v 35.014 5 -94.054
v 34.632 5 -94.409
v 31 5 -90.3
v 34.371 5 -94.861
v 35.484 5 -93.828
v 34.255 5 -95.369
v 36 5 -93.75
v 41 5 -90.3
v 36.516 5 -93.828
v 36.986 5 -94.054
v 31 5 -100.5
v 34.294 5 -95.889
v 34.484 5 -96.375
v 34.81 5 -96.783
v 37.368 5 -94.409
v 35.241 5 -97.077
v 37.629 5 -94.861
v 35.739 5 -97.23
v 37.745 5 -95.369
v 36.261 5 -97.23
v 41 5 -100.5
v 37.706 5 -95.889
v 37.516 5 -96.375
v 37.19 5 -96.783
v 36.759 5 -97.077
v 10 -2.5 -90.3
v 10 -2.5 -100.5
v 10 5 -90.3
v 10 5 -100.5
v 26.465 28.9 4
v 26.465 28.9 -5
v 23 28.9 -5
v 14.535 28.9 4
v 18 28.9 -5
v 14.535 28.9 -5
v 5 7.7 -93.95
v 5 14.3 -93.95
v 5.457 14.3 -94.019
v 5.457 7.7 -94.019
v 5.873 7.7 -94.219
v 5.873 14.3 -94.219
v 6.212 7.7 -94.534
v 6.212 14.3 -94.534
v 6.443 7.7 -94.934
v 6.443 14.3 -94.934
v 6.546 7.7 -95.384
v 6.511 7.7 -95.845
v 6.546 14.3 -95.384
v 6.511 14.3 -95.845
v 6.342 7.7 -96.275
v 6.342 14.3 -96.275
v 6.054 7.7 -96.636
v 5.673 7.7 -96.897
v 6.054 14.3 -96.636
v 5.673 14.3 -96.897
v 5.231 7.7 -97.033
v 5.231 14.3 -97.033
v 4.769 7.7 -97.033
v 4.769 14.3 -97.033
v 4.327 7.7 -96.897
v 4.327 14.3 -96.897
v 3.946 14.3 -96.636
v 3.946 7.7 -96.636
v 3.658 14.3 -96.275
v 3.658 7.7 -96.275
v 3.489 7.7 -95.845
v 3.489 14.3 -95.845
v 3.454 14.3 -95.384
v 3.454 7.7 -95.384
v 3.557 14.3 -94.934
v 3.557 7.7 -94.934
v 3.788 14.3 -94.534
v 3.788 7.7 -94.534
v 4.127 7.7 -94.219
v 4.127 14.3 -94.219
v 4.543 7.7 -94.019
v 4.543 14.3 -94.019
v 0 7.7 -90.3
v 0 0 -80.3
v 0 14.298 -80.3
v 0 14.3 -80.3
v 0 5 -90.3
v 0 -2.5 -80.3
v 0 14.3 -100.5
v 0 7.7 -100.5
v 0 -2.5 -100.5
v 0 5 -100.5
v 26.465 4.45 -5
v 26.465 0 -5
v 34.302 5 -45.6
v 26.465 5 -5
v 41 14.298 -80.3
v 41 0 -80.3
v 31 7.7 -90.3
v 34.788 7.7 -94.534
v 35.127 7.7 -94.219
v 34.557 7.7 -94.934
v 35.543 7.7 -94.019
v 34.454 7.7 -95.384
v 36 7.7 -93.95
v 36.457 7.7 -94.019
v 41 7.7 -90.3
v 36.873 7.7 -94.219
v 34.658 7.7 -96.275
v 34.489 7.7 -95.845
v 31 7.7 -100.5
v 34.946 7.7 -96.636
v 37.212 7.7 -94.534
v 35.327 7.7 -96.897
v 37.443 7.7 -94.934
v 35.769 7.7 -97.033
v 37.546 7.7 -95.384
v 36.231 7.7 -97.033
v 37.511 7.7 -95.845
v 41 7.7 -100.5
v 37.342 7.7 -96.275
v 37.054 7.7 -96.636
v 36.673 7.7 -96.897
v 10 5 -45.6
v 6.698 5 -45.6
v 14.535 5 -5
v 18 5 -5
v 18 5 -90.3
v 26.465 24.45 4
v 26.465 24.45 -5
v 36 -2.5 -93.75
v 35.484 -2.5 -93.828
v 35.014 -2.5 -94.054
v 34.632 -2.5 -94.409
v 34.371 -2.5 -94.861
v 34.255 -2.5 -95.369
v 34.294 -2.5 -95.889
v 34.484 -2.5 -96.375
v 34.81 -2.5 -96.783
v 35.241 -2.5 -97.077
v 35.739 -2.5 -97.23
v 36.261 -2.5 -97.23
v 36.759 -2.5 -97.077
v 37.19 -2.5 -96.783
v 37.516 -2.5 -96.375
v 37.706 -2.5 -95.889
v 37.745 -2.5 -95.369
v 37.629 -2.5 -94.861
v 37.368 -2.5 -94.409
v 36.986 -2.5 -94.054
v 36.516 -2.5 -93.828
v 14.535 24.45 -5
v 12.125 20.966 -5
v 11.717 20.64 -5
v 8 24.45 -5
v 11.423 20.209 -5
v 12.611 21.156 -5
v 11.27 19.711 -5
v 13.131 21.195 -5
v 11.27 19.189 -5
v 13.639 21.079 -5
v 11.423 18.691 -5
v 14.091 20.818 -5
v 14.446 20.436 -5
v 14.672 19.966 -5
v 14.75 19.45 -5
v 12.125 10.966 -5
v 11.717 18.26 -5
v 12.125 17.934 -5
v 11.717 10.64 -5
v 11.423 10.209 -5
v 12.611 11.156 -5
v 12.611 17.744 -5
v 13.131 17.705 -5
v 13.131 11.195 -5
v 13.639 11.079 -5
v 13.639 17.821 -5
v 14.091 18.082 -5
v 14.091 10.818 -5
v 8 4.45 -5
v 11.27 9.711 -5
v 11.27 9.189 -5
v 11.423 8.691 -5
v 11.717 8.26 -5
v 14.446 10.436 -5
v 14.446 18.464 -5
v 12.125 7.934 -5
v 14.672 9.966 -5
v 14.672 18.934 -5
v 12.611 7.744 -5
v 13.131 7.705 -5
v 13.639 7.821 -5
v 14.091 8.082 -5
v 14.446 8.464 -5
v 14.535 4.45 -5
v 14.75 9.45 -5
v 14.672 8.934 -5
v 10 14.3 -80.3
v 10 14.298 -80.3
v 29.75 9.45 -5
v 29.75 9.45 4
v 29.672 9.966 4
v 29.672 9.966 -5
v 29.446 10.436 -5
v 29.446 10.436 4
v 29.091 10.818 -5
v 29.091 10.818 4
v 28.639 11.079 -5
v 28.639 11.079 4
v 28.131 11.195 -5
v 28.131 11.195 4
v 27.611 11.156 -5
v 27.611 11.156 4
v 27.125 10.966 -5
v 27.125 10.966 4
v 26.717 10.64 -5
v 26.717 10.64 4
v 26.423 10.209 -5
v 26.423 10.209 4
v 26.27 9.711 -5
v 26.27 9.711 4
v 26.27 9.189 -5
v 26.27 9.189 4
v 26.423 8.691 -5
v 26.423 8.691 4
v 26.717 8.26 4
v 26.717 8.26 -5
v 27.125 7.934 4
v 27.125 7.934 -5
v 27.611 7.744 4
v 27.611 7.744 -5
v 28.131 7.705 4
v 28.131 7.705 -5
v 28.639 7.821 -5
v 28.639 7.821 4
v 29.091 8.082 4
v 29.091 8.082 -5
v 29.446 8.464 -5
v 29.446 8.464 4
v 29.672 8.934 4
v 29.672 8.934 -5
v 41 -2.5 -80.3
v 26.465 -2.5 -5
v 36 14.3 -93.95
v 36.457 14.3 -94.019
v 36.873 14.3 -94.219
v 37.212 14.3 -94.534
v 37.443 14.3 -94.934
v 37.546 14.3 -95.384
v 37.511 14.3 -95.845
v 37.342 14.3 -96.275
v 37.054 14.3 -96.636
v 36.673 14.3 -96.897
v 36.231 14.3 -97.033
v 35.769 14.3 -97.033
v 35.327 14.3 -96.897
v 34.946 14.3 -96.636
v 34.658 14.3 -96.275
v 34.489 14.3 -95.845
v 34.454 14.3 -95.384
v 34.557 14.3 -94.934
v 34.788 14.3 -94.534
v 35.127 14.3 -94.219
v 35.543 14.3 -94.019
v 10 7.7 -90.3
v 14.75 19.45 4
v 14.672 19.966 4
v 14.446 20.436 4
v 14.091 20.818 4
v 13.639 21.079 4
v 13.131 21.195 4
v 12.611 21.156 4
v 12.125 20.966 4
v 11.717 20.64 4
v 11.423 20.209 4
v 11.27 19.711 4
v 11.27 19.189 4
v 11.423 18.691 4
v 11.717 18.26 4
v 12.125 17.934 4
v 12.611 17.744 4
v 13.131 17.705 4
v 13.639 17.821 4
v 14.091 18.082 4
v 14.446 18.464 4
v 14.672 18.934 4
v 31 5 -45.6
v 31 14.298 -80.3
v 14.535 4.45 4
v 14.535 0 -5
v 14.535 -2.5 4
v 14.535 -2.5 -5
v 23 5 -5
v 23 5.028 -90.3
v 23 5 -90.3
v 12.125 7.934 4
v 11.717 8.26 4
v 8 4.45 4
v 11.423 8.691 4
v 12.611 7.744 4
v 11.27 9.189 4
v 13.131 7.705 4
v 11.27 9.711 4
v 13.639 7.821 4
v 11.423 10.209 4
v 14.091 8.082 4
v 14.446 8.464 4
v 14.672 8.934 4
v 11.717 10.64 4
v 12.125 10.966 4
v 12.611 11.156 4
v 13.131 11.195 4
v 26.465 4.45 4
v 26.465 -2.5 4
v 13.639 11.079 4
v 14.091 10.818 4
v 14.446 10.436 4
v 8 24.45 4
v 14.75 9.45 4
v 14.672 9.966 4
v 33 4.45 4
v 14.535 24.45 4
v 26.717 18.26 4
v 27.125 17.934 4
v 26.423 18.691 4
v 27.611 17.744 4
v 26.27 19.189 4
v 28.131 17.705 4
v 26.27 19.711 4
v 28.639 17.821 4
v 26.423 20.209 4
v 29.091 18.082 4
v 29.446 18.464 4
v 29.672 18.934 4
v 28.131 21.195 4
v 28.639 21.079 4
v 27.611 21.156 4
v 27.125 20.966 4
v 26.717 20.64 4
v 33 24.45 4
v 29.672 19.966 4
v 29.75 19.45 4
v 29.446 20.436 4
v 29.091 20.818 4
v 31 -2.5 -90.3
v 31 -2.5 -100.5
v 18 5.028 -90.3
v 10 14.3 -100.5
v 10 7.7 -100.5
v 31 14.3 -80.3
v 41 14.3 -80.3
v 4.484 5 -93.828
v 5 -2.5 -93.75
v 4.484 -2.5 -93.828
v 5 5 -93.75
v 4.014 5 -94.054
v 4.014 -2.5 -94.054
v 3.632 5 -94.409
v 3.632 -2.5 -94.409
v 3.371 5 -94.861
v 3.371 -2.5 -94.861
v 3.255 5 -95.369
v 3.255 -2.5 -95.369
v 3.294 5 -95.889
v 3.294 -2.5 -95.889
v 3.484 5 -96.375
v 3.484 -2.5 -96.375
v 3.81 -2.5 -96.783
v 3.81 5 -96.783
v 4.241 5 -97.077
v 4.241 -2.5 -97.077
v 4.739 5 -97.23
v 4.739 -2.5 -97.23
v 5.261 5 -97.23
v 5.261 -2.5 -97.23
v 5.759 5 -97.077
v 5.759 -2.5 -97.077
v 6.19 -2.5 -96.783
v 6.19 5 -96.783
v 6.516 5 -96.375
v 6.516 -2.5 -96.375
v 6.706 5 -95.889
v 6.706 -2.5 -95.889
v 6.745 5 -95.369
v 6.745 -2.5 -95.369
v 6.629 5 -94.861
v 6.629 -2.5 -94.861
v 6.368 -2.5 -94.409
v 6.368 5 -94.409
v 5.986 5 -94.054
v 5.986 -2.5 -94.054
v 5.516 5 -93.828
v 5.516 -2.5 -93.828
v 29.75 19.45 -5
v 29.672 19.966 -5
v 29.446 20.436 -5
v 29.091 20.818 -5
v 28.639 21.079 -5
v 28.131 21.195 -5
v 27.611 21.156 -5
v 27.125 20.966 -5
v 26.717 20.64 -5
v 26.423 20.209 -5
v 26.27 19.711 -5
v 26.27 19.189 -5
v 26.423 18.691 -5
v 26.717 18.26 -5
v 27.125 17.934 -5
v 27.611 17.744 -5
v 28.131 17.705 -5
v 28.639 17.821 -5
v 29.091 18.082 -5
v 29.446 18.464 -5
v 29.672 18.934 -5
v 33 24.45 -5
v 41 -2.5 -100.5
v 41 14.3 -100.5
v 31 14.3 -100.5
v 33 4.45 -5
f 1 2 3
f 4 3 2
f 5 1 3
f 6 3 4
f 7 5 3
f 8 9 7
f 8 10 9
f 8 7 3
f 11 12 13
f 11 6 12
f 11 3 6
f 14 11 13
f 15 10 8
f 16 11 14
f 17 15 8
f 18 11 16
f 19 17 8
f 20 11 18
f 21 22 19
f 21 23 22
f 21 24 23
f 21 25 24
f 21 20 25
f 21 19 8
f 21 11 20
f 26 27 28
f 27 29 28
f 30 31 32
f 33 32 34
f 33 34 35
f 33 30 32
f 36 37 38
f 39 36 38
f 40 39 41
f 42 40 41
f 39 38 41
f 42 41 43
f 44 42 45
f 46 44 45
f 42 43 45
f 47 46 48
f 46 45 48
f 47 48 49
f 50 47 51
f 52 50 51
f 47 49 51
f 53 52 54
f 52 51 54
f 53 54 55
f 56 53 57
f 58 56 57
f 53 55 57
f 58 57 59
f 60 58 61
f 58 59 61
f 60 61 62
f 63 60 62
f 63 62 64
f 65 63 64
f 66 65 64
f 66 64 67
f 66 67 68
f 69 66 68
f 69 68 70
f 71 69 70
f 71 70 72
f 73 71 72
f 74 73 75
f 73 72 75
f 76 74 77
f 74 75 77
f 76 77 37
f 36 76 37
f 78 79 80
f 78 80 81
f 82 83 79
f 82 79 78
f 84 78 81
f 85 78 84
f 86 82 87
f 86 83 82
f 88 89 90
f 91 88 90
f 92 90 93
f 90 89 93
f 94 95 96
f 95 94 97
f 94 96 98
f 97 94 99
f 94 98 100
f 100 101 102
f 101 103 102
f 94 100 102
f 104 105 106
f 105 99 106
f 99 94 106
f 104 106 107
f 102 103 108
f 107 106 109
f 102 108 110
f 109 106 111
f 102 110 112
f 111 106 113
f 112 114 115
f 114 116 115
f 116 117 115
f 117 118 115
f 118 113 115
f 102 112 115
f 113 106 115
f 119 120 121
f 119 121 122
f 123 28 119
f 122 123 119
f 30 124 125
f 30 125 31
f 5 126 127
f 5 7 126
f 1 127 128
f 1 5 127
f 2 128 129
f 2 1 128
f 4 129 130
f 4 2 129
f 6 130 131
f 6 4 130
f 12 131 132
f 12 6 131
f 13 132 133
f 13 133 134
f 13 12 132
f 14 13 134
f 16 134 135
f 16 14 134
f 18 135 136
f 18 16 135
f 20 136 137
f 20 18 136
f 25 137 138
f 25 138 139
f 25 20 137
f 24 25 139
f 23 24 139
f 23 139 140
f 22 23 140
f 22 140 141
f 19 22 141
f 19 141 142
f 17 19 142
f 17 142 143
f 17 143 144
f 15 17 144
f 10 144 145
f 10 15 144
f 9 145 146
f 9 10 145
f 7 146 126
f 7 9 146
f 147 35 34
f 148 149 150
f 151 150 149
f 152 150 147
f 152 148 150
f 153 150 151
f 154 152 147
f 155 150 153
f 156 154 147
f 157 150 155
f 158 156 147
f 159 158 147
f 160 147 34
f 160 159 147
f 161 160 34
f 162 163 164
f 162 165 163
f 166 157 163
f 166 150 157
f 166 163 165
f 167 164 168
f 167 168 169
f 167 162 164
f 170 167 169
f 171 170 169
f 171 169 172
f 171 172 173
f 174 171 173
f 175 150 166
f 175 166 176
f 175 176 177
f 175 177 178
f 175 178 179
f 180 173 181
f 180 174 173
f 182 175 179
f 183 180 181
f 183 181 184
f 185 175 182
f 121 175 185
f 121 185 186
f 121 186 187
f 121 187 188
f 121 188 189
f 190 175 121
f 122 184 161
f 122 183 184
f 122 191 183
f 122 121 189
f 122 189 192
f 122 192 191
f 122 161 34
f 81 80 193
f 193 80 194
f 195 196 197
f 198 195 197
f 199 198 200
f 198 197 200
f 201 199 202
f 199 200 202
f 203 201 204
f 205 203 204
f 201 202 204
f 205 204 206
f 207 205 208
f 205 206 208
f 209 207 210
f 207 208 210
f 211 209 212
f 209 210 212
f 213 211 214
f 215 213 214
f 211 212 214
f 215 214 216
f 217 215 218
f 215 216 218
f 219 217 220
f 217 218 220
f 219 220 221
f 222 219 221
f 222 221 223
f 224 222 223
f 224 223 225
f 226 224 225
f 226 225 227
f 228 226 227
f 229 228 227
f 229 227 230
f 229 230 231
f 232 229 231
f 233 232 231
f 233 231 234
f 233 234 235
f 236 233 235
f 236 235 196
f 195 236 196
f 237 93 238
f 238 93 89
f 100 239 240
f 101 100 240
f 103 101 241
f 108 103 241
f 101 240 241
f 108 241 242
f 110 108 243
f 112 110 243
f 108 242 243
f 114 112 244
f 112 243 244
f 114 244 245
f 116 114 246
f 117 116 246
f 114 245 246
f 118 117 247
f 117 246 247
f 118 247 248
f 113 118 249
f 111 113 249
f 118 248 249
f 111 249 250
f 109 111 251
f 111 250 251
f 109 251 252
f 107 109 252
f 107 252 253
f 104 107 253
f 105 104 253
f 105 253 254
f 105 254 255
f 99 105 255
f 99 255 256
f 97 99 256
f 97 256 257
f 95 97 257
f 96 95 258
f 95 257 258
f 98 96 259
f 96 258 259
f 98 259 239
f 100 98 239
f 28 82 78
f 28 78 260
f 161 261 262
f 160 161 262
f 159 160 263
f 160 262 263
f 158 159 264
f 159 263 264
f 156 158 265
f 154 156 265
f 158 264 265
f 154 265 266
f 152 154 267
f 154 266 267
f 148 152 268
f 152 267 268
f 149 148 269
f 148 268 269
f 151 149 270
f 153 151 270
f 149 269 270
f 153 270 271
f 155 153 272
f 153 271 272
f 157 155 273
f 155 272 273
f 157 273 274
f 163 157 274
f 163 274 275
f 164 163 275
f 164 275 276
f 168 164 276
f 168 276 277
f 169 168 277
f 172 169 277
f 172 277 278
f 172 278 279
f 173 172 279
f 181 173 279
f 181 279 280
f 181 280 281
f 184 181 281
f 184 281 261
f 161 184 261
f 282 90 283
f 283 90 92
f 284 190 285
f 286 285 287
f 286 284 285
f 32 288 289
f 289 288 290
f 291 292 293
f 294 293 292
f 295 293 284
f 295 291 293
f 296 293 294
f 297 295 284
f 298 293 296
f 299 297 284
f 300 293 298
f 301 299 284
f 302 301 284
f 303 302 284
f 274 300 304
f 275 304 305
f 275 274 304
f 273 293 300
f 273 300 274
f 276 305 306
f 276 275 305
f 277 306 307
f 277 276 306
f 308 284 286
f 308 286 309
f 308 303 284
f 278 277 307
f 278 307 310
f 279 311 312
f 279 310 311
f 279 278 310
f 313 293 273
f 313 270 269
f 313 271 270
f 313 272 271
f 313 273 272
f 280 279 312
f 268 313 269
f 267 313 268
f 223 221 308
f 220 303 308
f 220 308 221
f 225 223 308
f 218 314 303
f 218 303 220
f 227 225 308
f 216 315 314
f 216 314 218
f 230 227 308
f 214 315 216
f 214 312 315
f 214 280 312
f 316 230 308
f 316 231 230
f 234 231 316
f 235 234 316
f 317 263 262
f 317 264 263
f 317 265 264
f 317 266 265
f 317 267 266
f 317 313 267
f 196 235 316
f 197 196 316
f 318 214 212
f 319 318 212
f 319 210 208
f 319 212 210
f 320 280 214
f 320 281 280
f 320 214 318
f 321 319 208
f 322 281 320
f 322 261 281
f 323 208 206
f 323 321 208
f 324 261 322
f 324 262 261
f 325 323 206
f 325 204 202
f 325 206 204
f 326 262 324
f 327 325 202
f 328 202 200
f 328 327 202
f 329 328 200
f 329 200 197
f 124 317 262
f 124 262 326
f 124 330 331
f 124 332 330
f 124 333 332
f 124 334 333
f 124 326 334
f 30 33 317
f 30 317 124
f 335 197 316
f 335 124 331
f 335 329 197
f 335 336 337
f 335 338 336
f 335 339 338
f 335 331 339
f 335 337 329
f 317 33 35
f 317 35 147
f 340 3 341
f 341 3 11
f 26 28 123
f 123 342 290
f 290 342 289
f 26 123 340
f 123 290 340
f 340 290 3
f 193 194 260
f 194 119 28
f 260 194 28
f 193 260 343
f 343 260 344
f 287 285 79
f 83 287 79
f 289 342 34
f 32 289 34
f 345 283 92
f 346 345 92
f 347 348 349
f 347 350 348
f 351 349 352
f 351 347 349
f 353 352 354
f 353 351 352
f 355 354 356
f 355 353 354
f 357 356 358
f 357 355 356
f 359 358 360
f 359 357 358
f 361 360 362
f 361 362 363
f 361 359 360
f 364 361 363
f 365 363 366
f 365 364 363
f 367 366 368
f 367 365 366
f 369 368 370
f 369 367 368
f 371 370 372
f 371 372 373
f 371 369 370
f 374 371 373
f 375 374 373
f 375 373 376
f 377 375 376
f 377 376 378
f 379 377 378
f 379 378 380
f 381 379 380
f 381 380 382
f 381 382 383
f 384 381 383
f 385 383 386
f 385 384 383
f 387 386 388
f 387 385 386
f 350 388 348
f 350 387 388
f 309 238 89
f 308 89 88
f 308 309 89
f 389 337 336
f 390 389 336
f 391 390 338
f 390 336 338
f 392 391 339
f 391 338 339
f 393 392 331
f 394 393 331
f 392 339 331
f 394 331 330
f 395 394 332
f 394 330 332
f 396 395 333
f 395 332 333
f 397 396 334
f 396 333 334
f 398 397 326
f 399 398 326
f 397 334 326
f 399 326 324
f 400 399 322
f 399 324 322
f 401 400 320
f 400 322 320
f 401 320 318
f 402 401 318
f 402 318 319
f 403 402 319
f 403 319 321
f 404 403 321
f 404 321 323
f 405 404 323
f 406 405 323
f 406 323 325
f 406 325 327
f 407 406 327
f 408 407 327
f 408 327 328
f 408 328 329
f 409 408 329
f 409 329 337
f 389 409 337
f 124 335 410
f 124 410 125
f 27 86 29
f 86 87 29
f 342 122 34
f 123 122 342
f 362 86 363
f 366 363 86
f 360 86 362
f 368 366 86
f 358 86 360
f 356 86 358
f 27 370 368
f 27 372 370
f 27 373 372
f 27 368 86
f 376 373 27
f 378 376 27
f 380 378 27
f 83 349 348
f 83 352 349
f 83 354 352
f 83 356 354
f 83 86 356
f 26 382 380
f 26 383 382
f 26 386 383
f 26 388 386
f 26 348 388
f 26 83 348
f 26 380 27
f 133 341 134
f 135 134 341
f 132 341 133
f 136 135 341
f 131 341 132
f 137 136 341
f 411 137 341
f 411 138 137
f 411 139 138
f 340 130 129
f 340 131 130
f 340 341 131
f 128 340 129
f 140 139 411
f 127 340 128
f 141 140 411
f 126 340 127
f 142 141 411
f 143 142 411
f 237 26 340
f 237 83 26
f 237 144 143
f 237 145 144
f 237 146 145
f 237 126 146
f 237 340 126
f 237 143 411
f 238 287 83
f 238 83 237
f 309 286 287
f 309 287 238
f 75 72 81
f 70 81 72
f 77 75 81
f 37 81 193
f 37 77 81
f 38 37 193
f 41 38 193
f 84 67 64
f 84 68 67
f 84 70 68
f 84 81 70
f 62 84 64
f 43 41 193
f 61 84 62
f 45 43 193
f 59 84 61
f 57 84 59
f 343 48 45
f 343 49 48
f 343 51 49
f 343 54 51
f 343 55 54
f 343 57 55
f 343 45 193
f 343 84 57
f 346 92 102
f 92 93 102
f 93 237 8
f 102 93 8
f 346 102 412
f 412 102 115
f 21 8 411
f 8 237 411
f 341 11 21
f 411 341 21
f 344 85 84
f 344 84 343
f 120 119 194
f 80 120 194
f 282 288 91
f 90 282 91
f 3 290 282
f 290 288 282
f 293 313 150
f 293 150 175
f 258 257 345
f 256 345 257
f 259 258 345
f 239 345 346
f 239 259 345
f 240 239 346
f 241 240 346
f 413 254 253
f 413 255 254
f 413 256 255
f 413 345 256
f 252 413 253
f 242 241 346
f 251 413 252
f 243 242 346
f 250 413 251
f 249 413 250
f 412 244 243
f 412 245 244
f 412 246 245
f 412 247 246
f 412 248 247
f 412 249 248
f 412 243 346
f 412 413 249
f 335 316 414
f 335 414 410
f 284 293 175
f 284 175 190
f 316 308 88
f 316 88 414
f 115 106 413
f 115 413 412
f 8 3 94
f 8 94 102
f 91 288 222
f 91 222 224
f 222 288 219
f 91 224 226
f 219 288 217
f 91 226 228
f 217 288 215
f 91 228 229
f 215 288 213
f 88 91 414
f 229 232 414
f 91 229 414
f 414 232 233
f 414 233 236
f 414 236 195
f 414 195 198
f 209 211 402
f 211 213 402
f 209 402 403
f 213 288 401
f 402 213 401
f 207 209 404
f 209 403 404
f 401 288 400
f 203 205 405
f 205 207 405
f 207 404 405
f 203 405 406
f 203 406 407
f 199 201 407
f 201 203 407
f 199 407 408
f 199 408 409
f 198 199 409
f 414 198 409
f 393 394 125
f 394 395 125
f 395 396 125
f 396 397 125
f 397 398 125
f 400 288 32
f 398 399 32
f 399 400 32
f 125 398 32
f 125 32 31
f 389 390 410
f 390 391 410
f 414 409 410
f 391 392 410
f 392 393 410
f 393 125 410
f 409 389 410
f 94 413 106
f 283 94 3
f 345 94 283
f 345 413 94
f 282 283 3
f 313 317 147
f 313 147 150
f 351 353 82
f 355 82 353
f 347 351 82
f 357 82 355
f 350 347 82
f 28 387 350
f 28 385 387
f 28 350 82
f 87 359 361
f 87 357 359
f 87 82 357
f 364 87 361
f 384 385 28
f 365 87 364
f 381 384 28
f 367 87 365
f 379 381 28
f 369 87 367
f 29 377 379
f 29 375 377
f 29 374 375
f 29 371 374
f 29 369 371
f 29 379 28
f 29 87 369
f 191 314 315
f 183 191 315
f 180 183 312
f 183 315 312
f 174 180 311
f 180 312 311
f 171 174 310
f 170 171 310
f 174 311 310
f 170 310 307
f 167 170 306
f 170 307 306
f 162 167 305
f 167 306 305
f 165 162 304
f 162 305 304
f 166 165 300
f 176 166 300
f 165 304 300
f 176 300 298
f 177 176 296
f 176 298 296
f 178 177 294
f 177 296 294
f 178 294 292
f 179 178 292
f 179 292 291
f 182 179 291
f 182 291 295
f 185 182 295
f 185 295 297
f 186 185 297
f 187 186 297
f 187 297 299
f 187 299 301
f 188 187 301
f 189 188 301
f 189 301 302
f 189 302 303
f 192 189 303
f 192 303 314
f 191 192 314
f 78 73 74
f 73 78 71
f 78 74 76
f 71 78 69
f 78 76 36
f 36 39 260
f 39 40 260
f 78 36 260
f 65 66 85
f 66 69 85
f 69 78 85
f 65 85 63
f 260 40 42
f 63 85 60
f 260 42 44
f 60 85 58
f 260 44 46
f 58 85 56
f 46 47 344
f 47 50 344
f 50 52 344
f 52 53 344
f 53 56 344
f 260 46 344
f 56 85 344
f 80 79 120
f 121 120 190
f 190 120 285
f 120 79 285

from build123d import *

# Parameters (mm, degrees)
SKETCH1_W            = 41
SKETCH1_H            = 100.5
BOSS_EXTRUDE1_DEPTH  = 5
SKETCH2_W            = 21
SKETCH2_H            = 10.2
CUT_EXTRUDE1_DEPTH   = 109.656569061
SKETCH9_R            = 1.75
CUT_EXTRUDE4_DEPTH   = 109.656569061
CUT_EXTRUDE5_DEPTH   = 109.656569061
BOSS_EXTRUDE4_DEPTH  = 23.9
SKETCH16_W           = 5
SKETCH16_H           = 85.3
BOSS_EXTRUDE5_DEPTH  = 23.9
CUT_EXTRUDE8_DEPTH   = 108.072218619
BOSS_EXTRUDE6_DEPTH  = 28.9
SKETCH25_W           = 6.53486924
SKETCH25_H           = 4.45
CUT_EXTRUDE9_DEPTH   = 108.872424651
SKETCH26_R           = 1.75
CUT_EXTRUDE10_DEPTH  = 113.323016341
SKETCH27_R           = 1.75
BOSS_EXTRUDE7_DEPTH  = 2.5
BOSS_EXTRUDE8_START  = 4
SKETCH28_R           = 1.75
BOSS_EXTRUDE8_DEPTH  = 4
SKETCH29_W           = 10
SKETCH29_H           = 10
BOSS_EXTRUDE9_DEPTH  = 2.7
SKETCH30_W           = 10
SKETCH30_H           = 20.2
BOSS_EXTRUDE10_DEPTH = 6.6
SKETCH31_R           = 1.55
CUT_EXTRUDE11_DEPTH  = 6.6
CHAMFER2_SIZE        = 34.7
CHAMFER2_SIZE_2      = 9.297836977


with BuildPart() as part:
    # Sketch1 → Boss-Extrude1 (new body)
    with BuildSketch(Plane(origin=(0, 0, 0), x_dir=(1, 0, 0), z_dir=(0, 1, 0))):
        with Locations((20.5, 50.25)):
            Rectangle(SKETCH1_W, SKETCH1_H)
    extrude(amount=BOSS_EXTRUDE1_DEPTH)

    # Sketch2 → Cut-Extrude1 (cut, through all)
    with BuildSketch(Plane(origin=(0, 5, 0), x_dir=(1, 0, 0), z_dir=(0, 1, 0))):
        with Locations((20.5, 95.4)):
            Rectangle(SKETCH2_W, SKETCH2_H)
    extrude(amount=-CUT_EXTRUDE1_DEPTH, mode=Mode.SUBTRACT)

    # Sketch9 → Cut-Extrude4 (cut, through all)
    with BuildSketch(Plane(origin=(0, 5, 0), x_dir=(1, 0, 0), z_dir=(0, 1, 0))):
        with Locations(Location((5, 95.5, 0), (0, 0, 270))):
            Circle(SKETCH9_R)
        with Locations(Location((36, 95.5, 0), (0, 0, 270))):
            Circle(SKETCH9_R)
    extrude(amount=-CUT_EXTRUDE4_DEPTH, mode=Mode.SUBTRACT)

    # Sketch11 → Cut-Extrude5 (cut, through all)
    with BuildSketch(Plane(origin=(0, 5, 0), x_dir=(1, 0, 0), z_dir=(0, 1, 0))):
        Polygon((15.5, 0), (0, 80.3), (0, 0), align=None)
        Polygon((25.5, 0), (41, 80.3), (41, 0), align=None)
    extrude(amount=-CUT_EXTRUDE5_DEPTH, mode=Mode.SUBTRACT)

    # Sketch12 → Boss-Extrude4 (add)
    with BuildSketch(Plane(origin=(0, 5, 0), x_dir=(1, 0, 0), z_dir=(0, 1, 0))):
        Polygon((25.5, 0), (15.5, 0), (14.53486924, 5), (26.46513076, 5), align=None)
    extrude(amount=BOSS_EXTRUDE4_DEPTH)

    # Sketch16 → Boss-Extrude5 (add)
    with BuildSketch(Plane(origin=(0, 5, 0), x_dir=(1, 0, 0), z_dir=(0, 1, 0))):
        with Locations((20.5, 47.65)):
            Rectangle(SKETCH16_W, SKETCH16_H)
    extrude(amount=BOSS_EXTRUDE5_DEPTH)

    # Sketch17 → Cut-Extrude8 (cut, through all)
    with BuildSketch(Plane.ZY.offset(-18)):
        Polygon((-90.4, 5), (-5, 28.9), (-90.3, 28.9), align=None)
    extrude(amount=-CUT_EXTRUDE8_DEPTH, mode=Mode.SUBTRACT)

    # Sketch23 → Boss-Extrude6 (add)
    with BuildSketch(Plane(origin=(0, 28.9, 0), x_dir=(1, 0, 0), z_dir=(0, 1, 0))):
        Polygon((26.46513076, 5), (33, 5), (33, 0), (25.5, 0), align=None)
        Polygon((14.53486924, 5), (8, 5), (8, 0), (15.5, 0), align=None)
    extrude(amount=-BOSS_EXTRUDE6_DEPTH)

    # Sketch25 → Cut-Extrude9 (cut, through all)
    with BuildSketch(Plane(origin=(0, 0, -5), x_dir=(-1, 0, 0), z_dir=(0, 0, -1))):
        with Locations((-11.26743462, 2.225)):
            Rectangle(SKETCH25_W, SKETCH25_H)
        with Locations((-29.73256538, 2.225)):
            Rectangle(SKETCH25_W, SKETCH25_H)
        with Locations((-11.26743462, 26.675)):
            Rectangle(SKETCH25_W, SKETCH25_H)
        with Locations((-29.73256538, 26.675)):
            Rectangle(SKETCH25_W, SKETCH25_H)
    extrude(amount=-CUT_EXTRUDE9_DEPTH, mode=Mode.SUBTRACT)

    # Sketch26 → Cut-Extrude10 (cut, through all)
    with BuildSketch(Plane.XY):
        with Locations((13, 19.45)):
            Circle(SKETCH26_R)
        with Locations((28, 19.45)):
            Circle(SKETCH26_R)
        with Locations((13, 9.45)):
            Circle(SKETCH26_R)
        with Locations((28, 9.45)):
            Circle(SKETCH26_R)
    extrude(amount=-CUT_EXTRUDE10_DEPTH, mode=Mode.SUBTRACT)

    # Sketch27 → Boss-Extrude7 (add)
    with BuildSketch(Plane.XZ):
        Polygon((26.46513076, -5), (26.46513076, 0), (14.53486924, 0), (14.53486924, -5), (0, -80.3), (0, -100.5), (10, -100.5), (10, -90.3), (31, -90.3), (31, -100.5), (41, -100.5), (41, -80.3), align=None)
        with Locations(Location((5, -95.5, 0), (0, 0, 90))):
            Circle(SKETCH27_R, mode=Mode.SUBTRACT)
        with Locations(Location((36, -95.5, 0), (0, 0, 90))):
            Circle(SKETCH27_R, mode=Mode.SUBTRACT)
    extrude(amount=BOSS_EXTRUDE7_DEPTH)

    # Sketch28 → Boss-Extrude8 (add)
    with BuildSketch(Plane.XY.offset(BOSS_EXTRUDE8_START)):
        Polygon((26.46513076, -2.5), (26.46513076, 4.45), (33, 4.45), (33, 24.45), (26.46513076, 24.45), (26.46513076, 28.9), (14.53486924, 28.9), (14.53486924, 24.45), (8, 24.45), (8, 4.45), (14.53486924, 4.45), (14.53486924, -2.5), align=None)
        with Locations((28, 9.45)):
            Circle(SKETCH28_R, mode=Mode.SUBTRACT)
        with Locations((13, 9.45)):
            Circle(SKETCH28_R, mode=Mode.SUBTRACT)
        with Locations((28, 19.45)):
            Circle(SKETCH28_R, mode=Mode.SUBTRACT)
        with Locations((13, 19.45)):
            Circle(SKETCH28_R, mode=Mode.SUBTRACT)
    extrude(amount=-BOSS_EXTRUDE8_DEPTH)

    # Sketch29 → Boss-Extrude9 (add)
    with BuildSketch(Plane(origin=(0, 5, 0), x_dir=(1, 0, 0), z_dir=(0, 1, 0))):
        with Locations((36, 85.3)):
            Rectangle(SKETCH29_W, SKETCH29_H)
        with Locations((5, 85.3)):
            Rectangle(SKETCH29_W, SKETCH29_H)
    extrude(amount=BOSS_EXTRUDE9_DEPTH)

    # Sketch30 → Boss-Extrude10 (add)
    with BuildSketch(Plane(origin=(0, 7.7, 0), x_dir=(1, 0, 0), z_dir=(0, 1, 0))):
        with Locations((5, 90.4)):
            Rectangle(SKETCH30_W, SKETCH30_H)
        with Locations((36, 90.4)):
            Rectangle(SKETCH30_W, SKETCH30_H)
    extrude(amount=BOSS_EXTRUDE10_DEPTH)

    # Sketch31 → Cut-Extrude11 (cut)
    with BuildSketch(Plane(origin=(0, 14.3, 0), x_dir=(1, 0, 0), z_dir=(0, 1, 0))):
        with Locations(Location((36, 95.5, 0), (0, 0, 270))):
            Circle(SKETCH31_R)
        with Locations(Location((5, 95.5, 0), (0, 0, 270))):
            Circle(SKETCH31_R)
    extrude(amount=-CUT_EXTRUDE11_DEPTH, mode=Mode.SUBTRACT)

    # Chamfer2
    # the kernel refuses this chamfer: 34.7, 9.297836977 mm, written as the material it adds along each edge
    with BuildSketch(Plane(origin=(41, 5, -80.3), x_dir=(0, -0.009967146577156432, 0.9999503267608395), z_dir=(-1, 0, 0))) as chamfer2_piece_1_section:
        Polygon((CHAMFER2_SIZE * 0.999950326761, CHAMFER2_SIZE * 0.00996714657716), (-CHAMFER2_SIZE_2 * 0.00996714657754, CHAMFER2_SIZE_2 * 0.9999503268), (0, 0), align=None)
    chamfer2_piece_1 = extrude(amount=10, mode=Mode.PRIVATE)
    chamfer2_piece_1 = split(chamfer2_piece_1, bisect_by=Plane(origin=(38.932419972, 8.049756371, -69.588601533), z_dir=(-0.9818753883596208, 0, -0.1895276278900885)), keep=Keep.TOP, mode=Mode.PRIVATE)
    add(chamfer2_piece_1)
    with BuildSketch(Plane(origin=(41, 5, -80.3), x_dir=(0, -0.009967146577156432, 0.9999503267608395), z_dir=(-1, 0, 0))) as chamfer2_piece_2_section:
        Polygon((CHAMFER2_SIZE * 0.999950326761, CHAMFER2_SIZE * 0.00996714657716), (-CHAMFER2_SIZE_2 * 0.00996714657754, CHAMFER2_SIZE_2 * 0.9999503268), (0, 0), align=None)
    chamfer2_piece_2 = extrude(amount=100.106238486, mode=Mode.PRIVATE)
    chamfer2_piece_2 = split(chamfer2_piece_2, bisect_by=Plane(origin=(2.067580028, 8.049756371, -69.588601533), z_dir=(0.9818753883596207, 0, -0.18952762789008884)), keep=Keep.TOP, mode=Mode.PRIVATE)
    chamfer2_piece_2 = split(chamfer2_piece_2, bisect_by=Plane(origin=(0, 8.049756371, -70.340774245), z_dir=(1, 0, 0)), keep=Keep.TOP, mode=Mode.PRIVATE)
    chamfer2_piece_2 = split(chamfer2_piece_2, bisect_by=Plane(origin=(10, 8.049756371, -70.340774245), z_dir=(-1, 0, 0)), keep=Keep.TOP, mode=Mode.PRIVATE)
    add(chamfer2_piece_2)
    with BuildSketch(Plane(origin=(0, 5, -80.3), x_dir=(0, -0.009967146577156432, 0.9999503267608395), z_dir=(1, 0, 0))) as chamfer2_piece_3_section:
        Polygon((CHAMFER2_SIZE * 0.999950326761, -CHAMFER2_SIZE * 0.00996714657716), (-CHAMFER2_SIZE_2 * 0.00996714657754, -CHAMFER2_SIZE_2 * 0.9999503268), (0, 0), align=None)
    chamfer2_piece_3 = extrude(amount=10, mode=Mode.PRIVATE)
    chamfer2_piece_3 = split(chamfer2_piece_3, bisect_by=Plane(origin=(2.067580028, 8.049756371, -69.588601533), z_dir=(0.9818753883596207, 0, -0.18952762789008884)), keep=Keep.TOP, mode=Mode.PRIVATE)
    add(chamfer2_piece_3)
    with BuildSketch(Plane(origin=(0, 5, -80.3), x_dir=(0, -0.009967146577156432, 0.9999503267608395), z_dir=(1, 0, 0))) as chamfer2_piece_4_section:
        Polygon((CHAMFER2_SIZE * 0.999950326761, -CHAMFER2_SIZE * 0.00996714657716), (-CHAMFER2_SIZE_2 * 0.00996714657754, -CHAMFER2_SIZE_2 * 0.9999503268), (0, 0), align=None)
    chamfer2_piece_4 = extrude(amount=100.106238486, mode=Mode.PRIVATE)
    chamfer2_piece_4 = split(chamfer2_piece_4, bisect_by=Plane(origin=(38.932419972, 8.049756371, -69.588601533), z_dir=(-0.9818753883596208, 0, -0.1895276278900885)), keep=Keep.TOP, mode=Mode.PRIVATE)
    chamfer2_piece_4 = split(chamfer2_piece_4, bisect_by=Plane(origin=(31, 8.049756371, -70.340774245), z_dir=(1, 0, 0)), keep=Keep.TOP, mode=Mode.PRIVATE)
    chamfer2_piece_4 = split(chamfer2_piece_4, bisect_by=Plane(origin=(41, 8.049756371, -70.340774245), z_dir=(-1, 0, 0)), keep=Keep.TOP, mode=Mode.PRIVATE)
    add(chamfer2_piece_4)


solid = part.part
